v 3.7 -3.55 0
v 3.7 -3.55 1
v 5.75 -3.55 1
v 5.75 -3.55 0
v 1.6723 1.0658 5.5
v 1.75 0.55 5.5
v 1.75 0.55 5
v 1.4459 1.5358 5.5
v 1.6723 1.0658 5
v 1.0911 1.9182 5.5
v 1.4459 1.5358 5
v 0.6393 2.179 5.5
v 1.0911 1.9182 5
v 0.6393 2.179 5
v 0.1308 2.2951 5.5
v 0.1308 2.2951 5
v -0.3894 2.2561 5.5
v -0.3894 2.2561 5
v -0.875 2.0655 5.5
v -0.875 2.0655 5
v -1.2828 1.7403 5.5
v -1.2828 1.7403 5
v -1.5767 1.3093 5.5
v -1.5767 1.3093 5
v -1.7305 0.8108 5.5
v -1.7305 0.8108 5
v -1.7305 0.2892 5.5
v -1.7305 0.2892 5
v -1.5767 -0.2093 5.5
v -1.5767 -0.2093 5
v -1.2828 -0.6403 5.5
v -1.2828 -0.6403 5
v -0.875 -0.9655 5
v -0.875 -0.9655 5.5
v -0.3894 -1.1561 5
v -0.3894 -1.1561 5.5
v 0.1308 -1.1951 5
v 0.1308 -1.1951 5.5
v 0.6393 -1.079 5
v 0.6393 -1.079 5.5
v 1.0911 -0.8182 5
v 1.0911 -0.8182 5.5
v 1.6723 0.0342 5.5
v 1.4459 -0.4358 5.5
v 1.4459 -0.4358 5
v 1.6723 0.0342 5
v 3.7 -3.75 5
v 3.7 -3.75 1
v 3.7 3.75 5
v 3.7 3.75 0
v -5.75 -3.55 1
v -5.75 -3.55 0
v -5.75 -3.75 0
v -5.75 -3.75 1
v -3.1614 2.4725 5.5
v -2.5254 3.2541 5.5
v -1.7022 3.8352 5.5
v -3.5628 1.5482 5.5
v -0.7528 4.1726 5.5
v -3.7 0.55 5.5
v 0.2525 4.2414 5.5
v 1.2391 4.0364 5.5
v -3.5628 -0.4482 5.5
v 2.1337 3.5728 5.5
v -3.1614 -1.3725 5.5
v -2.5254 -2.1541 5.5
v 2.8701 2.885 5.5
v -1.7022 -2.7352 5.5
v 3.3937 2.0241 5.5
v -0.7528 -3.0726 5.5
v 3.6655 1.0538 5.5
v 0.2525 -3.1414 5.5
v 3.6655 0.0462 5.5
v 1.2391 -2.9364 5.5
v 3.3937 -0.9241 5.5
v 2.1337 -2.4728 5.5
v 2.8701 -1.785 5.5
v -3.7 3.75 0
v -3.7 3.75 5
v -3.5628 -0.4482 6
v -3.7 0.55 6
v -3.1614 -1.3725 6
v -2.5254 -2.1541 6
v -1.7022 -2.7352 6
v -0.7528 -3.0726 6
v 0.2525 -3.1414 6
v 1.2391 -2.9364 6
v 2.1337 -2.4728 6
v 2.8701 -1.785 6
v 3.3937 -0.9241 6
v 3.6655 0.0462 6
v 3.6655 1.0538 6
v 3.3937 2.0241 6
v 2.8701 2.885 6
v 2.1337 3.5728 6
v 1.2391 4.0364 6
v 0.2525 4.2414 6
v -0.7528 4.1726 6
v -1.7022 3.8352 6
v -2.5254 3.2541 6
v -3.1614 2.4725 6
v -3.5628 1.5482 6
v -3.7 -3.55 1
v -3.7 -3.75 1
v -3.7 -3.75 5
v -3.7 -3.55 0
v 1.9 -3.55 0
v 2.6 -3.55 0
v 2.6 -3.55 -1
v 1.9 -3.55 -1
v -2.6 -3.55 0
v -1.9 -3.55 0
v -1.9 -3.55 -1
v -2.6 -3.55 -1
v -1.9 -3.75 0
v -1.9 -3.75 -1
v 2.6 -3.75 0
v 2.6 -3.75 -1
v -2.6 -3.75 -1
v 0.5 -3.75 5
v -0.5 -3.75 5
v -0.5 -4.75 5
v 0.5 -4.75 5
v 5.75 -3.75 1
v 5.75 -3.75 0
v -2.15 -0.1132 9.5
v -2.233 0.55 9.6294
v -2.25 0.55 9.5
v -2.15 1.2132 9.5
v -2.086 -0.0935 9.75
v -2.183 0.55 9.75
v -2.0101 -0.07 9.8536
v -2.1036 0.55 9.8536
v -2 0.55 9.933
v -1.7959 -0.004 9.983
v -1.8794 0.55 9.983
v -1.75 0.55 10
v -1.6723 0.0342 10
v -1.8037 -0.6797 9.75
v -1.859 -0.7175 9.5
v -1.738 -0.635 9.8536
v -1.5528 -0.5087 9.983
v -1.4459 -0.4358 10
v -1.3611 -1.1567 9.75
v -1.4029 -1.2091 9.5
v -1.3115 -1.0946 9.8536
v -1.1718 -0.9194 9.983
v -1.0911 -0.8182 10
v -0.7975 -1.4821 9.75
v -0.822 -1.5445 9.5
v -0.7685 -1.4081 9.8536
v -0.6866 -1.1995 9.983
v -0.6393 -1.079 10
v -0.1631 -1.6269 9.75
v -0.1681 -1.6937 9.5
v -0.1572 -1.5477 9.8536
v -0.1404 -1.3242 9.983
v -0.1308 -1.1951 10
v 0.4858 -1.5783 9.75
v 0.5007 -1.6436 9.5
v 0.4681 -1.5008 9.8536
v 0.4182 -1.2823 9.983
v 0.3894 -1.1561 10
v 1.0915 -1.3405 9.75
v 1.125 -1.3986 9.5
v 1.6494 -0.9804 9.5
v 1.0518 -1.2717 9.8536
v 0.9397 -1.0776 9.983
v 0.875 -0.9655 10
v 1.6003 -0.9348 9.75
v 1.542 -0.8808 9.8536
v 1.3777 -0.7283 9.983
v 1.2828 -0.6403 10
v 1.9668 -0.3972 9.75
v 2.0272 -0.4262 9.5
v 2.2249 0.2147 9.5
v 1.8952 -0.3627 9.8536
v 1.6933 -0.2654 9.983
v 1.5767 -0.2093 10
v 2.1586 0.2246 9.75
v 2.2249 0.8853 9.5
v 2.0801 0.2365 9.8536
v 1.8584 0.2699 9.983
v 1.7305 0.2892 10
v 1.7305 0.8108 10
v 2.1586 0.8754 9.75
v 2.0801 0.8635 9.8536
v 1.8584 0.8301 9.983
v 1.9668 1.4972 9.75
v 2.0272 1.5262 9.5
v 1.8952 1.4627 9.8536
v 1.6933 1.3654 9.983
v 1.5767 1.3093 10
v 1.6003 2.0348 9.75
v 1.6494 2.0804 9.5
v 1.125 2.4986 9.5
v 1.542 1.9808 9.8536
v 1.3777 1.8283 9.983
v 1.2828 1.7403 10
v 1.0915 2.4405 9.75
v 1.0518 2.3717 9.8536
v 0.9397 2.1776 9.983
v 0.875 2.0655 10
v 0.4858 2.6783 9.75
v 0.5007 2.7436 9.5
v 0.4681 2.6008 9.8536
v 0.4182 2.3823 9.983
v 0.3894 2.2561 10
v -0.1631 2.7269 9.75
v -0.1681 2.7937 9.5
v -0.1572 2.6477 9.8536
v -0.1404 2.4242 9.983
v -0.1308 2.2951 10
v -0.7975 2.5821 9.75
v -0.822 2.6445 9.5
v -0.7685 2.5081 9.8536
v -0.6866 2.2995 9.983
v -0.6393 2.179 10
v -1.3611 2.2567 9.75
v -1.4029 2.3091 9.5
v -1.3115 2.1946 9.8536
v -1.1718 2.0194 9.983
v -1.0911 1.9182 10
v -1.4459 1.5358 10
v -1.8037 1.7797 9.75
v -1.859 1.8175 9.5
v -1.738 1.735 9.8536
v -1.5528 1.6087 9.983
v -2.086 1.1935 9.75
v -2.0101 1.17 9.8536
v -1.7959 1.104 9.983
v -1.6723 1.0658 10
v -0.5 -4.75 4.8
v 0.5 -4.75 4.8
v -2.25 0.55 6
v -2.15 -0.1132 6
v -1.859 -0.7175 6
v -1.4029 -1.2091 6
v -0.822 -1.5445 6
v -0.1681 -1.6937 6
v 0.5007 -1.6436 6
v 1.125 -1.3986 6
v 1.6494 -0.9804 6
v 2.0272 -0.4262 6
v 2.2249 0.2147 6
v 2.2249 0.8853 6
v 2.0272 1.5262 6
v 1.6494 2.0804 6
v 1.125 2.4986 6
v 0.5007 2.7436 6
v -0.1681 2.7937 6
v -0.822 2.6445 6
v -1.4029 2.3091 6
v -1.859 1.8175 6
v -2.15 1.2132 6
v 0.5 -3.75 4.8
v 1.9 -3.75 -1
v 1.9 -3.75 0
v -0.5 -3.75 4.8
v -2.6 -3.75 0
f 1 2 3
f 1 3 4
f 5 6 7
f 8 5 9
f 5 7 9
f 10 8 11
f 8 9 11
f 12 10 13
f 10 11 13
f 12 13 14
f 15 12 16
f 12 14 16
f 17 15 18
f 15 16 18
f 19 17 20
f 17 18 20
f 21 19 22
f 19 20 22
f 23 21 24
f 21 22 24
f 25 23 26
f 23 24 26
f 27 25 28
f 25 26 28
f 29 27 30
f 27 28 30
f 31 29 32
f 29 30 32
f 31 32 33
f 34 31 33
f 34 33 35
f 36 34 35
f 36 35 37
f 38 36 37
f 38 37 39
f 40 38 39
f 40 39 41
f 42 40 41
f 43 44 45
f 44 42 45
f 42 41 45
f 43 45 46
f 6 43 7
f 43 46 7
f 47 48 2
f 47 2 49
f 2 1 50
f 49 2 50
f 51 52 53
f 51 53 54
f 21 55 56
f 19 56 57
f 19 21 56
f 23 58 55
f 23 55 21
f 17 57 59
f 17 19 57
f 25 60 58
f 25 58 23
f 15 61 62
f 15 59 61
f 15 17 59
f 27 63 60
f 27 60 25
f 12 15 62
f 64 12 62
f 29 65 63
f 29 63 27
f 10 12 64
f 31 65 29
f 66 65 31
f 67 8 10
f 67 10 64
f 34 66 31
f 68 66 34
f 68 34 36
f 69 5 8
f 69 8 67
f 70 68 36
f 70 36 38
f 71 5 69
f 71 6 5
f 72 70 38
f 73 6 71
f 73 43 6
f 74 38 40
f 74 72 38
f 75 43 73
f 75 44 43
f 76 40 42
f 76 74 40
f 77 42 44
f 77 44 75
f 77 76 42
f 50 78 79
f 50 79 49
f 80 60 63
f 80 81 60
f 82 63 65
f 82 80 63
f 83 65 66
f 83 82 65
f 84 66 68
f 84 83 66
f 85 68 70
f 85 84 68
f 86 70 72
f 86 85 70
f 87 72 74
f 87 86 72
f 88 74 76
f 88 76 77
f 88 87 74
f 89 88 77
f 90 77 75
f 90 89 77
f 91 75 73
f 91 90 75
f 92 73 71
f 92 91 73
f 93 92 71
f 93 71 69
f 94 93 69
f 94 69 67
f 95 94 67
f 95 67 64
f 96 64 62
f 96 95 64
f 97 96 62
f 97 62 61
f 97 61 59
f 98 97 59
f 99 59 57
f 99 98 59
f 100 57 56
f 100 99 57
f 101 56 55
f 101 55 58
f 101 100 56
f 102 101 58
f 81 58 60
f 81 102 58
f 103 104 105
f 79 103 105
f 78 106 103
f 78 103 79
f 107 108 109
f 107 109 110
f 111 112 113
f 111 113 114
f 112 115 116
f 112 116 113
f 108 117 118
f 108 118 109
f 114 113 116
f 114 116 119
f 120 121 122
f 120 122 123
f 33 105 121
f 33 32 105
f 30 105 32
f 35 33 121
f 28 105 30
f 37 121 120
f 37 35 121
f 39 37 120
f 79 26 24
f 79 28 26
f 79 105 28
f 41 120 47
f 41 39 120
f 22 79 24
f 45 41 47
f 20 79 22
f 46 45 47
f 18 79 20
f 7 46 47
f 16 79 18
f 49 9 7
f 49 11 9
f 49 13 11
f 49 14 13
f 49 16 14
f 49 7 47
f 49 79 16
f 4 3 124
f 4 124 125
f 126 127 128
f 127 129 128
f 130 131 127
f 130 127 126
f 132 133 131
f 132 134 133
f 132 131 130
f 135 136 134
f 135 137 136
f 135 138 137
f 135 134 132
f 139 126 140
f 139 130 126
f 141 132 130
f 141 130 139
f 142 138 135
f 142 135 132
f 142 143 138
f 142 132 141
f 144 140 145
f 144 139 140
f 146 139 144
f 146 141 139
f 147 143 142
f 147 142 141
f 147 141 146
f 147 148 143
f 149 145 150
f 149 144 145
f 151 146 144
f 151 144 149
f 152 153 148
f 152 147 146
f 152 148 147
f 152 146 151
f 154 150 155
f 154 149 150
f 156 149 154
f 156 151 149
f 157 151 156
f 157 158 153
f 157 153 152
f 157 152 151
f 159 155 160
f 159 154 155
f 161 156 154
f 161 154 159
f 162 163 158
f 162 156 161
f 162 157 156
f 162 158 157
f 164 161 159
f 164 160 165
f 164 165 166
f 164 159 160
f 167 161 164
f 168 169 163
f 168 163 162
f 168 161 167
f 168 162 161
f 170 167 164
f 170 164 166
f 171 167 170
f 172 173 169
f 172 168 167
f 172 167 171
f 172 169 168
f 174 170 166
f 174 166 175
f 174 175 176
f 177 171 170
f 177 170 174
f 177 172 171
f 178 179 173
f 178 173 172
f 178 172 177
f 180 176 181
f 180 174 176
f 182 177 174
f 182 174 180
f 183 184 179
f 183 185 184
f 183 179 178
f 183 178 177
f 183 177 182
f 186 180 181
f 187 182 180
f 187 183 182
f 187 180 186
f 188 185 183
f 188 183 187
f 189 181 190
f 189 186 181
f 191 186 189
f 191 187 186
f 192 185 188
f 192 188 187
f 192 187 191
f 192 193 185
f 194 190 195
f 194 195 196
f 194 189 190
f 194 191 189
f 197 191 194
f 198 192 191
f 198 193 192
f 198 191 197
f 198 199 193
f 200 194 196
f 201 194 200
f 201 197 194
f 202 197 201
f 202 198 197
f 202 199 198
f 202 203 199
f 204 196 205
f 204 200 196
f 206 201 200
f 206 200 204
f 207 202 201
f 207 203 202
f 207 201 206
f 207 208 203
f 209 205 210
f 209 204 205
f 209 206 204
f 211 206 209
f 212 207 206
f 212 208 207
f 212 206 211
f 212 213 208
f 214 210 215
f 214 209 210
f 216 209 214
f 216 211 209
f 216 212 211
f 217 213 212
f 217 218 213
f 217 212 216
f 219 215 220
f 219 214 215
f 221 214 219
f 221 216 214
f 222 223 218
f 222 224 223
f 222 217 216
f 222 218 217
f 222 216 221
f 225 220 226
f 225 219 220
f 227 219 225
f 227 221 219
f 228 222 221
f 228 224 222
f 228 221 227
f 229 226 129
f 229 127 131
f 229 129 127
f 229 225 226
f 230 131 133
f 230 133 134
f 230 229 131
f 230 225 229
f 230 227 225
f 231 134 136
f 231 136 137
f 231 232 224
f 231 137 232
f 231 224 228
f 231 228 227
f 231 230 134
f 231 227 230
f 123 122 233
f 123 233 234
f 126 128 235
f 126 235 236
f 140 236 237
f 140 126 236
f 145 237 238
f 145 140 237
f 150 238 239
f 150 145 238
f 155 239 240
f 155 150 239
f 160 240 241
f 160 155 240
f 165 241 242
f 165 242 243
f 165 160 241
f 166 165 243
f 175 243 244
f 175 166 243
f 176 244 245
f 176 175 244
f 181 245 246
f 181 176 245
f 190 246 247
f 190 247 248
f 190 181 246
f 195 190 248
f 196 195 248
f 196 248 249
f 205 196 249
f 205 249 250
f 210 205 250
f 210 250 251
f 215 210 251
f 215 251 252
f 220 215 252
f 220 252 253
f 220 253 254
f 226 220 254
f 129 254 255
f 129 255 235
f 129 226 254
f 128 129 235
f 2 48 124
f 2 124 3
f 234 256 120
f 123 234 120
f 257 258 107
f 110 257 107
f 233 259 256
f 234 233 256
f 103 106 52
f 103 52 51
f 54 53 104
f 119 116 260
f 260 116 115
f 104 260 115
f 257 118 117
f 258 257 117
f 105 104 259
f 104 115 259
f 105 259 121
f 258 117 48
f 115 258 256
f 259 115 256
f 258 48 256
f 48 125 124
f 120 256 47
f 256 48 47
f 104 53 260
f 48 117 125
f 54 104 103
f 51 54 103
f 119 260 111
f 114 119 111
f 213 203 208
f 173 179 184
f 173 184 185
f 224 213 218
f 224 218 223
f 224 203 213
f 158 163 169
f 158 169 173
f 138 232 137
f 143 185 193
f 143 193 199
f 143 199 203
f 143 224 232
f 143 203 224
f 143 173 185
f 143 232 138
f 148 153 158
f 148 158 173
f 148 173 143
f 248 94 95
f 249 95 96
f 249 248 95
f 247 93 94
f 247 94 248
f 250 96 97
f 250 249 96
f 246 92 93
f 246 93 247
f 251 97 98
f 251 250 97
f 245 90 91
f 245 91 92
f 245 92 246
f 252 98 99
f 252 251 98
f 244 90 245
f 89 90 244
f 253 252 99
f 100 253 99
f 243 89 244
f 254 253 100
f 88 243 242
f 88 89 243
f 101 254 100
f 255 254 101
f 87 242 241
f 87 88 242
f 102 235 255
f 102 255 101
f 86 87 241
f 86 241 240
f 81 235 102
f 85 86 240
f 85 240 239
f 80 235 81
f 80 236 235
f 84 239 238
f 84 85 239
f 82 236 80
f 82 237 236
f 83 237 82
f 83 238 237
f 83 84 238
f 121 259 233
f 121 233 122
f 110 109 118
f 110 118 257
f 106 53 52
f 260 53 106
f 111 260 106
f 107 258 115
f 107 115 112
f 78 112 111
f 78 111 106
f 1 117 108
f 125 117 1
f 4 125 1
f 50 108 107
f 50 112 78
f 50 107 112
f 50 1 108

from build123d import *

# Parameters (mm, degrees)
SKETCH_1_W      = 7.4
SKETCH_1_H      = 7.5
EXTRUDE_1_DEPTH = 5
SKETCH_2_R      = 1.75
EXTRUDE_2_DEPTH = 2.2
FILLET_1_R      = 0.5
SKETCH_5_W      = 1
SKETCH_5_H      = 0.2
EXTRUDE_3_DEPTH = 2.05
SKETCH_6_W      = 1
SKETCH_6_H      = 0.2
EXTRUDE_4_DEPTH = 2.05
SKETCH_7_W      = 0.7
SKETCH_7_H      = 0.2
EXTRUDE_5_DEPTH = 1
SKETCH_8_W      = 1
SKETCH_8_H      = 0.2
EXTRUDE_6_DEPTH = 1


with BuildPart() as part:
    # 草图1 → 凸台-拉伸1 (new body)
    with BuildSketch(Plane.XY):
        Rectangle(SKETCH_1_W, SKETCH_1_H)
    extrude(amount=EXTRUDE_1_DEPTH)

    # 草图2 → 凸台-拉伸2 (add)
    with BuildSketch(Plane.XY.offset(5)):
        with Locations((0, 0.55)):
            Circle(SKETCH_2_R)
    extrude(amount=EXTRUDE_2_DEPTH)

    # 草图4 → 旋转1 (revolve)
    with BuildSketch(Plane(origin=(0, 0.55, 0), x_dir=(1, 0, 0), z_dir=(0, 1, 0)), mode=Mode.PRIVATE) as revolve_1_sk:
        Polygon((0, -5.5), (3.7, -5.5), (3.7, -6), (2.25, -6), (2.25, -10), (0, -10), align=None)
    revolve(revolve_1_sk.sketch.rotate(Axis((0, 0.55, -1.831178889), (0, 0, 1)), 180), axis=Axis((0, 0.55, -1.831178889), (0, 0, 1)))

    # 圆角1
    fillet_1_edges = [part.edges().sort_by_distance(p)[0] for p in [
        (2.25, 0.55, 10),
    ]]
    fillet(fillet_1_edges, radius=FILLET_1_R)

    # 草图5 → 凸台-拉伸3 (add)
    with BuildSketch(Plane(origin=(3.7, 0, 0), x_dir=(0, 0, -1), z_dir=(1, 0, 0))):
        with Locations((-0.5, -3.65)):
            Rectangle(SKETCH_5_W, SKETCH_5_H)
    extrude(amount=EXTRUDE_3_DEPTH)

    # 草图6 → 凸台-拉伸4 (add)
    with BuildSketch(Plane.ZY.offset(3.7)):
        with Locations((0.5, -3.65)):
            Rectangle(SKETCH_6_W, SKETCH_6_H)
    extrude(amount=EXTRUDE_4_DEPTH)

    # 草图7 → 凸台-拉伸5 (add)
    with BuildSketch(Plane(origin=(0, 0, 0), x_dir=(-1, 0, 0), z_dir=(0, 0, -1))):
        with Locations((-2.25, -3.65)):
            Rectangle(SKETCH_7_W, SKETCH_7_H)
        with Locations((2.25, -3.65)):
            Rectangle(SKETCH_7_W, SKETCH_7_H)
    extrude(amount=EXTRUDE_5_DEPTH)

    # 草图8 → 凸台-拉伸6 (add)
    with BuildSketch(Plane.XZ.offset(3.75)):
        with Locations((0, 4.9)):
            Rectangle(SKETCH_8_W, SKETCH_8_H)
    extrude(amount=EXTRUDE_6_DEPTH)


solid = part.part
